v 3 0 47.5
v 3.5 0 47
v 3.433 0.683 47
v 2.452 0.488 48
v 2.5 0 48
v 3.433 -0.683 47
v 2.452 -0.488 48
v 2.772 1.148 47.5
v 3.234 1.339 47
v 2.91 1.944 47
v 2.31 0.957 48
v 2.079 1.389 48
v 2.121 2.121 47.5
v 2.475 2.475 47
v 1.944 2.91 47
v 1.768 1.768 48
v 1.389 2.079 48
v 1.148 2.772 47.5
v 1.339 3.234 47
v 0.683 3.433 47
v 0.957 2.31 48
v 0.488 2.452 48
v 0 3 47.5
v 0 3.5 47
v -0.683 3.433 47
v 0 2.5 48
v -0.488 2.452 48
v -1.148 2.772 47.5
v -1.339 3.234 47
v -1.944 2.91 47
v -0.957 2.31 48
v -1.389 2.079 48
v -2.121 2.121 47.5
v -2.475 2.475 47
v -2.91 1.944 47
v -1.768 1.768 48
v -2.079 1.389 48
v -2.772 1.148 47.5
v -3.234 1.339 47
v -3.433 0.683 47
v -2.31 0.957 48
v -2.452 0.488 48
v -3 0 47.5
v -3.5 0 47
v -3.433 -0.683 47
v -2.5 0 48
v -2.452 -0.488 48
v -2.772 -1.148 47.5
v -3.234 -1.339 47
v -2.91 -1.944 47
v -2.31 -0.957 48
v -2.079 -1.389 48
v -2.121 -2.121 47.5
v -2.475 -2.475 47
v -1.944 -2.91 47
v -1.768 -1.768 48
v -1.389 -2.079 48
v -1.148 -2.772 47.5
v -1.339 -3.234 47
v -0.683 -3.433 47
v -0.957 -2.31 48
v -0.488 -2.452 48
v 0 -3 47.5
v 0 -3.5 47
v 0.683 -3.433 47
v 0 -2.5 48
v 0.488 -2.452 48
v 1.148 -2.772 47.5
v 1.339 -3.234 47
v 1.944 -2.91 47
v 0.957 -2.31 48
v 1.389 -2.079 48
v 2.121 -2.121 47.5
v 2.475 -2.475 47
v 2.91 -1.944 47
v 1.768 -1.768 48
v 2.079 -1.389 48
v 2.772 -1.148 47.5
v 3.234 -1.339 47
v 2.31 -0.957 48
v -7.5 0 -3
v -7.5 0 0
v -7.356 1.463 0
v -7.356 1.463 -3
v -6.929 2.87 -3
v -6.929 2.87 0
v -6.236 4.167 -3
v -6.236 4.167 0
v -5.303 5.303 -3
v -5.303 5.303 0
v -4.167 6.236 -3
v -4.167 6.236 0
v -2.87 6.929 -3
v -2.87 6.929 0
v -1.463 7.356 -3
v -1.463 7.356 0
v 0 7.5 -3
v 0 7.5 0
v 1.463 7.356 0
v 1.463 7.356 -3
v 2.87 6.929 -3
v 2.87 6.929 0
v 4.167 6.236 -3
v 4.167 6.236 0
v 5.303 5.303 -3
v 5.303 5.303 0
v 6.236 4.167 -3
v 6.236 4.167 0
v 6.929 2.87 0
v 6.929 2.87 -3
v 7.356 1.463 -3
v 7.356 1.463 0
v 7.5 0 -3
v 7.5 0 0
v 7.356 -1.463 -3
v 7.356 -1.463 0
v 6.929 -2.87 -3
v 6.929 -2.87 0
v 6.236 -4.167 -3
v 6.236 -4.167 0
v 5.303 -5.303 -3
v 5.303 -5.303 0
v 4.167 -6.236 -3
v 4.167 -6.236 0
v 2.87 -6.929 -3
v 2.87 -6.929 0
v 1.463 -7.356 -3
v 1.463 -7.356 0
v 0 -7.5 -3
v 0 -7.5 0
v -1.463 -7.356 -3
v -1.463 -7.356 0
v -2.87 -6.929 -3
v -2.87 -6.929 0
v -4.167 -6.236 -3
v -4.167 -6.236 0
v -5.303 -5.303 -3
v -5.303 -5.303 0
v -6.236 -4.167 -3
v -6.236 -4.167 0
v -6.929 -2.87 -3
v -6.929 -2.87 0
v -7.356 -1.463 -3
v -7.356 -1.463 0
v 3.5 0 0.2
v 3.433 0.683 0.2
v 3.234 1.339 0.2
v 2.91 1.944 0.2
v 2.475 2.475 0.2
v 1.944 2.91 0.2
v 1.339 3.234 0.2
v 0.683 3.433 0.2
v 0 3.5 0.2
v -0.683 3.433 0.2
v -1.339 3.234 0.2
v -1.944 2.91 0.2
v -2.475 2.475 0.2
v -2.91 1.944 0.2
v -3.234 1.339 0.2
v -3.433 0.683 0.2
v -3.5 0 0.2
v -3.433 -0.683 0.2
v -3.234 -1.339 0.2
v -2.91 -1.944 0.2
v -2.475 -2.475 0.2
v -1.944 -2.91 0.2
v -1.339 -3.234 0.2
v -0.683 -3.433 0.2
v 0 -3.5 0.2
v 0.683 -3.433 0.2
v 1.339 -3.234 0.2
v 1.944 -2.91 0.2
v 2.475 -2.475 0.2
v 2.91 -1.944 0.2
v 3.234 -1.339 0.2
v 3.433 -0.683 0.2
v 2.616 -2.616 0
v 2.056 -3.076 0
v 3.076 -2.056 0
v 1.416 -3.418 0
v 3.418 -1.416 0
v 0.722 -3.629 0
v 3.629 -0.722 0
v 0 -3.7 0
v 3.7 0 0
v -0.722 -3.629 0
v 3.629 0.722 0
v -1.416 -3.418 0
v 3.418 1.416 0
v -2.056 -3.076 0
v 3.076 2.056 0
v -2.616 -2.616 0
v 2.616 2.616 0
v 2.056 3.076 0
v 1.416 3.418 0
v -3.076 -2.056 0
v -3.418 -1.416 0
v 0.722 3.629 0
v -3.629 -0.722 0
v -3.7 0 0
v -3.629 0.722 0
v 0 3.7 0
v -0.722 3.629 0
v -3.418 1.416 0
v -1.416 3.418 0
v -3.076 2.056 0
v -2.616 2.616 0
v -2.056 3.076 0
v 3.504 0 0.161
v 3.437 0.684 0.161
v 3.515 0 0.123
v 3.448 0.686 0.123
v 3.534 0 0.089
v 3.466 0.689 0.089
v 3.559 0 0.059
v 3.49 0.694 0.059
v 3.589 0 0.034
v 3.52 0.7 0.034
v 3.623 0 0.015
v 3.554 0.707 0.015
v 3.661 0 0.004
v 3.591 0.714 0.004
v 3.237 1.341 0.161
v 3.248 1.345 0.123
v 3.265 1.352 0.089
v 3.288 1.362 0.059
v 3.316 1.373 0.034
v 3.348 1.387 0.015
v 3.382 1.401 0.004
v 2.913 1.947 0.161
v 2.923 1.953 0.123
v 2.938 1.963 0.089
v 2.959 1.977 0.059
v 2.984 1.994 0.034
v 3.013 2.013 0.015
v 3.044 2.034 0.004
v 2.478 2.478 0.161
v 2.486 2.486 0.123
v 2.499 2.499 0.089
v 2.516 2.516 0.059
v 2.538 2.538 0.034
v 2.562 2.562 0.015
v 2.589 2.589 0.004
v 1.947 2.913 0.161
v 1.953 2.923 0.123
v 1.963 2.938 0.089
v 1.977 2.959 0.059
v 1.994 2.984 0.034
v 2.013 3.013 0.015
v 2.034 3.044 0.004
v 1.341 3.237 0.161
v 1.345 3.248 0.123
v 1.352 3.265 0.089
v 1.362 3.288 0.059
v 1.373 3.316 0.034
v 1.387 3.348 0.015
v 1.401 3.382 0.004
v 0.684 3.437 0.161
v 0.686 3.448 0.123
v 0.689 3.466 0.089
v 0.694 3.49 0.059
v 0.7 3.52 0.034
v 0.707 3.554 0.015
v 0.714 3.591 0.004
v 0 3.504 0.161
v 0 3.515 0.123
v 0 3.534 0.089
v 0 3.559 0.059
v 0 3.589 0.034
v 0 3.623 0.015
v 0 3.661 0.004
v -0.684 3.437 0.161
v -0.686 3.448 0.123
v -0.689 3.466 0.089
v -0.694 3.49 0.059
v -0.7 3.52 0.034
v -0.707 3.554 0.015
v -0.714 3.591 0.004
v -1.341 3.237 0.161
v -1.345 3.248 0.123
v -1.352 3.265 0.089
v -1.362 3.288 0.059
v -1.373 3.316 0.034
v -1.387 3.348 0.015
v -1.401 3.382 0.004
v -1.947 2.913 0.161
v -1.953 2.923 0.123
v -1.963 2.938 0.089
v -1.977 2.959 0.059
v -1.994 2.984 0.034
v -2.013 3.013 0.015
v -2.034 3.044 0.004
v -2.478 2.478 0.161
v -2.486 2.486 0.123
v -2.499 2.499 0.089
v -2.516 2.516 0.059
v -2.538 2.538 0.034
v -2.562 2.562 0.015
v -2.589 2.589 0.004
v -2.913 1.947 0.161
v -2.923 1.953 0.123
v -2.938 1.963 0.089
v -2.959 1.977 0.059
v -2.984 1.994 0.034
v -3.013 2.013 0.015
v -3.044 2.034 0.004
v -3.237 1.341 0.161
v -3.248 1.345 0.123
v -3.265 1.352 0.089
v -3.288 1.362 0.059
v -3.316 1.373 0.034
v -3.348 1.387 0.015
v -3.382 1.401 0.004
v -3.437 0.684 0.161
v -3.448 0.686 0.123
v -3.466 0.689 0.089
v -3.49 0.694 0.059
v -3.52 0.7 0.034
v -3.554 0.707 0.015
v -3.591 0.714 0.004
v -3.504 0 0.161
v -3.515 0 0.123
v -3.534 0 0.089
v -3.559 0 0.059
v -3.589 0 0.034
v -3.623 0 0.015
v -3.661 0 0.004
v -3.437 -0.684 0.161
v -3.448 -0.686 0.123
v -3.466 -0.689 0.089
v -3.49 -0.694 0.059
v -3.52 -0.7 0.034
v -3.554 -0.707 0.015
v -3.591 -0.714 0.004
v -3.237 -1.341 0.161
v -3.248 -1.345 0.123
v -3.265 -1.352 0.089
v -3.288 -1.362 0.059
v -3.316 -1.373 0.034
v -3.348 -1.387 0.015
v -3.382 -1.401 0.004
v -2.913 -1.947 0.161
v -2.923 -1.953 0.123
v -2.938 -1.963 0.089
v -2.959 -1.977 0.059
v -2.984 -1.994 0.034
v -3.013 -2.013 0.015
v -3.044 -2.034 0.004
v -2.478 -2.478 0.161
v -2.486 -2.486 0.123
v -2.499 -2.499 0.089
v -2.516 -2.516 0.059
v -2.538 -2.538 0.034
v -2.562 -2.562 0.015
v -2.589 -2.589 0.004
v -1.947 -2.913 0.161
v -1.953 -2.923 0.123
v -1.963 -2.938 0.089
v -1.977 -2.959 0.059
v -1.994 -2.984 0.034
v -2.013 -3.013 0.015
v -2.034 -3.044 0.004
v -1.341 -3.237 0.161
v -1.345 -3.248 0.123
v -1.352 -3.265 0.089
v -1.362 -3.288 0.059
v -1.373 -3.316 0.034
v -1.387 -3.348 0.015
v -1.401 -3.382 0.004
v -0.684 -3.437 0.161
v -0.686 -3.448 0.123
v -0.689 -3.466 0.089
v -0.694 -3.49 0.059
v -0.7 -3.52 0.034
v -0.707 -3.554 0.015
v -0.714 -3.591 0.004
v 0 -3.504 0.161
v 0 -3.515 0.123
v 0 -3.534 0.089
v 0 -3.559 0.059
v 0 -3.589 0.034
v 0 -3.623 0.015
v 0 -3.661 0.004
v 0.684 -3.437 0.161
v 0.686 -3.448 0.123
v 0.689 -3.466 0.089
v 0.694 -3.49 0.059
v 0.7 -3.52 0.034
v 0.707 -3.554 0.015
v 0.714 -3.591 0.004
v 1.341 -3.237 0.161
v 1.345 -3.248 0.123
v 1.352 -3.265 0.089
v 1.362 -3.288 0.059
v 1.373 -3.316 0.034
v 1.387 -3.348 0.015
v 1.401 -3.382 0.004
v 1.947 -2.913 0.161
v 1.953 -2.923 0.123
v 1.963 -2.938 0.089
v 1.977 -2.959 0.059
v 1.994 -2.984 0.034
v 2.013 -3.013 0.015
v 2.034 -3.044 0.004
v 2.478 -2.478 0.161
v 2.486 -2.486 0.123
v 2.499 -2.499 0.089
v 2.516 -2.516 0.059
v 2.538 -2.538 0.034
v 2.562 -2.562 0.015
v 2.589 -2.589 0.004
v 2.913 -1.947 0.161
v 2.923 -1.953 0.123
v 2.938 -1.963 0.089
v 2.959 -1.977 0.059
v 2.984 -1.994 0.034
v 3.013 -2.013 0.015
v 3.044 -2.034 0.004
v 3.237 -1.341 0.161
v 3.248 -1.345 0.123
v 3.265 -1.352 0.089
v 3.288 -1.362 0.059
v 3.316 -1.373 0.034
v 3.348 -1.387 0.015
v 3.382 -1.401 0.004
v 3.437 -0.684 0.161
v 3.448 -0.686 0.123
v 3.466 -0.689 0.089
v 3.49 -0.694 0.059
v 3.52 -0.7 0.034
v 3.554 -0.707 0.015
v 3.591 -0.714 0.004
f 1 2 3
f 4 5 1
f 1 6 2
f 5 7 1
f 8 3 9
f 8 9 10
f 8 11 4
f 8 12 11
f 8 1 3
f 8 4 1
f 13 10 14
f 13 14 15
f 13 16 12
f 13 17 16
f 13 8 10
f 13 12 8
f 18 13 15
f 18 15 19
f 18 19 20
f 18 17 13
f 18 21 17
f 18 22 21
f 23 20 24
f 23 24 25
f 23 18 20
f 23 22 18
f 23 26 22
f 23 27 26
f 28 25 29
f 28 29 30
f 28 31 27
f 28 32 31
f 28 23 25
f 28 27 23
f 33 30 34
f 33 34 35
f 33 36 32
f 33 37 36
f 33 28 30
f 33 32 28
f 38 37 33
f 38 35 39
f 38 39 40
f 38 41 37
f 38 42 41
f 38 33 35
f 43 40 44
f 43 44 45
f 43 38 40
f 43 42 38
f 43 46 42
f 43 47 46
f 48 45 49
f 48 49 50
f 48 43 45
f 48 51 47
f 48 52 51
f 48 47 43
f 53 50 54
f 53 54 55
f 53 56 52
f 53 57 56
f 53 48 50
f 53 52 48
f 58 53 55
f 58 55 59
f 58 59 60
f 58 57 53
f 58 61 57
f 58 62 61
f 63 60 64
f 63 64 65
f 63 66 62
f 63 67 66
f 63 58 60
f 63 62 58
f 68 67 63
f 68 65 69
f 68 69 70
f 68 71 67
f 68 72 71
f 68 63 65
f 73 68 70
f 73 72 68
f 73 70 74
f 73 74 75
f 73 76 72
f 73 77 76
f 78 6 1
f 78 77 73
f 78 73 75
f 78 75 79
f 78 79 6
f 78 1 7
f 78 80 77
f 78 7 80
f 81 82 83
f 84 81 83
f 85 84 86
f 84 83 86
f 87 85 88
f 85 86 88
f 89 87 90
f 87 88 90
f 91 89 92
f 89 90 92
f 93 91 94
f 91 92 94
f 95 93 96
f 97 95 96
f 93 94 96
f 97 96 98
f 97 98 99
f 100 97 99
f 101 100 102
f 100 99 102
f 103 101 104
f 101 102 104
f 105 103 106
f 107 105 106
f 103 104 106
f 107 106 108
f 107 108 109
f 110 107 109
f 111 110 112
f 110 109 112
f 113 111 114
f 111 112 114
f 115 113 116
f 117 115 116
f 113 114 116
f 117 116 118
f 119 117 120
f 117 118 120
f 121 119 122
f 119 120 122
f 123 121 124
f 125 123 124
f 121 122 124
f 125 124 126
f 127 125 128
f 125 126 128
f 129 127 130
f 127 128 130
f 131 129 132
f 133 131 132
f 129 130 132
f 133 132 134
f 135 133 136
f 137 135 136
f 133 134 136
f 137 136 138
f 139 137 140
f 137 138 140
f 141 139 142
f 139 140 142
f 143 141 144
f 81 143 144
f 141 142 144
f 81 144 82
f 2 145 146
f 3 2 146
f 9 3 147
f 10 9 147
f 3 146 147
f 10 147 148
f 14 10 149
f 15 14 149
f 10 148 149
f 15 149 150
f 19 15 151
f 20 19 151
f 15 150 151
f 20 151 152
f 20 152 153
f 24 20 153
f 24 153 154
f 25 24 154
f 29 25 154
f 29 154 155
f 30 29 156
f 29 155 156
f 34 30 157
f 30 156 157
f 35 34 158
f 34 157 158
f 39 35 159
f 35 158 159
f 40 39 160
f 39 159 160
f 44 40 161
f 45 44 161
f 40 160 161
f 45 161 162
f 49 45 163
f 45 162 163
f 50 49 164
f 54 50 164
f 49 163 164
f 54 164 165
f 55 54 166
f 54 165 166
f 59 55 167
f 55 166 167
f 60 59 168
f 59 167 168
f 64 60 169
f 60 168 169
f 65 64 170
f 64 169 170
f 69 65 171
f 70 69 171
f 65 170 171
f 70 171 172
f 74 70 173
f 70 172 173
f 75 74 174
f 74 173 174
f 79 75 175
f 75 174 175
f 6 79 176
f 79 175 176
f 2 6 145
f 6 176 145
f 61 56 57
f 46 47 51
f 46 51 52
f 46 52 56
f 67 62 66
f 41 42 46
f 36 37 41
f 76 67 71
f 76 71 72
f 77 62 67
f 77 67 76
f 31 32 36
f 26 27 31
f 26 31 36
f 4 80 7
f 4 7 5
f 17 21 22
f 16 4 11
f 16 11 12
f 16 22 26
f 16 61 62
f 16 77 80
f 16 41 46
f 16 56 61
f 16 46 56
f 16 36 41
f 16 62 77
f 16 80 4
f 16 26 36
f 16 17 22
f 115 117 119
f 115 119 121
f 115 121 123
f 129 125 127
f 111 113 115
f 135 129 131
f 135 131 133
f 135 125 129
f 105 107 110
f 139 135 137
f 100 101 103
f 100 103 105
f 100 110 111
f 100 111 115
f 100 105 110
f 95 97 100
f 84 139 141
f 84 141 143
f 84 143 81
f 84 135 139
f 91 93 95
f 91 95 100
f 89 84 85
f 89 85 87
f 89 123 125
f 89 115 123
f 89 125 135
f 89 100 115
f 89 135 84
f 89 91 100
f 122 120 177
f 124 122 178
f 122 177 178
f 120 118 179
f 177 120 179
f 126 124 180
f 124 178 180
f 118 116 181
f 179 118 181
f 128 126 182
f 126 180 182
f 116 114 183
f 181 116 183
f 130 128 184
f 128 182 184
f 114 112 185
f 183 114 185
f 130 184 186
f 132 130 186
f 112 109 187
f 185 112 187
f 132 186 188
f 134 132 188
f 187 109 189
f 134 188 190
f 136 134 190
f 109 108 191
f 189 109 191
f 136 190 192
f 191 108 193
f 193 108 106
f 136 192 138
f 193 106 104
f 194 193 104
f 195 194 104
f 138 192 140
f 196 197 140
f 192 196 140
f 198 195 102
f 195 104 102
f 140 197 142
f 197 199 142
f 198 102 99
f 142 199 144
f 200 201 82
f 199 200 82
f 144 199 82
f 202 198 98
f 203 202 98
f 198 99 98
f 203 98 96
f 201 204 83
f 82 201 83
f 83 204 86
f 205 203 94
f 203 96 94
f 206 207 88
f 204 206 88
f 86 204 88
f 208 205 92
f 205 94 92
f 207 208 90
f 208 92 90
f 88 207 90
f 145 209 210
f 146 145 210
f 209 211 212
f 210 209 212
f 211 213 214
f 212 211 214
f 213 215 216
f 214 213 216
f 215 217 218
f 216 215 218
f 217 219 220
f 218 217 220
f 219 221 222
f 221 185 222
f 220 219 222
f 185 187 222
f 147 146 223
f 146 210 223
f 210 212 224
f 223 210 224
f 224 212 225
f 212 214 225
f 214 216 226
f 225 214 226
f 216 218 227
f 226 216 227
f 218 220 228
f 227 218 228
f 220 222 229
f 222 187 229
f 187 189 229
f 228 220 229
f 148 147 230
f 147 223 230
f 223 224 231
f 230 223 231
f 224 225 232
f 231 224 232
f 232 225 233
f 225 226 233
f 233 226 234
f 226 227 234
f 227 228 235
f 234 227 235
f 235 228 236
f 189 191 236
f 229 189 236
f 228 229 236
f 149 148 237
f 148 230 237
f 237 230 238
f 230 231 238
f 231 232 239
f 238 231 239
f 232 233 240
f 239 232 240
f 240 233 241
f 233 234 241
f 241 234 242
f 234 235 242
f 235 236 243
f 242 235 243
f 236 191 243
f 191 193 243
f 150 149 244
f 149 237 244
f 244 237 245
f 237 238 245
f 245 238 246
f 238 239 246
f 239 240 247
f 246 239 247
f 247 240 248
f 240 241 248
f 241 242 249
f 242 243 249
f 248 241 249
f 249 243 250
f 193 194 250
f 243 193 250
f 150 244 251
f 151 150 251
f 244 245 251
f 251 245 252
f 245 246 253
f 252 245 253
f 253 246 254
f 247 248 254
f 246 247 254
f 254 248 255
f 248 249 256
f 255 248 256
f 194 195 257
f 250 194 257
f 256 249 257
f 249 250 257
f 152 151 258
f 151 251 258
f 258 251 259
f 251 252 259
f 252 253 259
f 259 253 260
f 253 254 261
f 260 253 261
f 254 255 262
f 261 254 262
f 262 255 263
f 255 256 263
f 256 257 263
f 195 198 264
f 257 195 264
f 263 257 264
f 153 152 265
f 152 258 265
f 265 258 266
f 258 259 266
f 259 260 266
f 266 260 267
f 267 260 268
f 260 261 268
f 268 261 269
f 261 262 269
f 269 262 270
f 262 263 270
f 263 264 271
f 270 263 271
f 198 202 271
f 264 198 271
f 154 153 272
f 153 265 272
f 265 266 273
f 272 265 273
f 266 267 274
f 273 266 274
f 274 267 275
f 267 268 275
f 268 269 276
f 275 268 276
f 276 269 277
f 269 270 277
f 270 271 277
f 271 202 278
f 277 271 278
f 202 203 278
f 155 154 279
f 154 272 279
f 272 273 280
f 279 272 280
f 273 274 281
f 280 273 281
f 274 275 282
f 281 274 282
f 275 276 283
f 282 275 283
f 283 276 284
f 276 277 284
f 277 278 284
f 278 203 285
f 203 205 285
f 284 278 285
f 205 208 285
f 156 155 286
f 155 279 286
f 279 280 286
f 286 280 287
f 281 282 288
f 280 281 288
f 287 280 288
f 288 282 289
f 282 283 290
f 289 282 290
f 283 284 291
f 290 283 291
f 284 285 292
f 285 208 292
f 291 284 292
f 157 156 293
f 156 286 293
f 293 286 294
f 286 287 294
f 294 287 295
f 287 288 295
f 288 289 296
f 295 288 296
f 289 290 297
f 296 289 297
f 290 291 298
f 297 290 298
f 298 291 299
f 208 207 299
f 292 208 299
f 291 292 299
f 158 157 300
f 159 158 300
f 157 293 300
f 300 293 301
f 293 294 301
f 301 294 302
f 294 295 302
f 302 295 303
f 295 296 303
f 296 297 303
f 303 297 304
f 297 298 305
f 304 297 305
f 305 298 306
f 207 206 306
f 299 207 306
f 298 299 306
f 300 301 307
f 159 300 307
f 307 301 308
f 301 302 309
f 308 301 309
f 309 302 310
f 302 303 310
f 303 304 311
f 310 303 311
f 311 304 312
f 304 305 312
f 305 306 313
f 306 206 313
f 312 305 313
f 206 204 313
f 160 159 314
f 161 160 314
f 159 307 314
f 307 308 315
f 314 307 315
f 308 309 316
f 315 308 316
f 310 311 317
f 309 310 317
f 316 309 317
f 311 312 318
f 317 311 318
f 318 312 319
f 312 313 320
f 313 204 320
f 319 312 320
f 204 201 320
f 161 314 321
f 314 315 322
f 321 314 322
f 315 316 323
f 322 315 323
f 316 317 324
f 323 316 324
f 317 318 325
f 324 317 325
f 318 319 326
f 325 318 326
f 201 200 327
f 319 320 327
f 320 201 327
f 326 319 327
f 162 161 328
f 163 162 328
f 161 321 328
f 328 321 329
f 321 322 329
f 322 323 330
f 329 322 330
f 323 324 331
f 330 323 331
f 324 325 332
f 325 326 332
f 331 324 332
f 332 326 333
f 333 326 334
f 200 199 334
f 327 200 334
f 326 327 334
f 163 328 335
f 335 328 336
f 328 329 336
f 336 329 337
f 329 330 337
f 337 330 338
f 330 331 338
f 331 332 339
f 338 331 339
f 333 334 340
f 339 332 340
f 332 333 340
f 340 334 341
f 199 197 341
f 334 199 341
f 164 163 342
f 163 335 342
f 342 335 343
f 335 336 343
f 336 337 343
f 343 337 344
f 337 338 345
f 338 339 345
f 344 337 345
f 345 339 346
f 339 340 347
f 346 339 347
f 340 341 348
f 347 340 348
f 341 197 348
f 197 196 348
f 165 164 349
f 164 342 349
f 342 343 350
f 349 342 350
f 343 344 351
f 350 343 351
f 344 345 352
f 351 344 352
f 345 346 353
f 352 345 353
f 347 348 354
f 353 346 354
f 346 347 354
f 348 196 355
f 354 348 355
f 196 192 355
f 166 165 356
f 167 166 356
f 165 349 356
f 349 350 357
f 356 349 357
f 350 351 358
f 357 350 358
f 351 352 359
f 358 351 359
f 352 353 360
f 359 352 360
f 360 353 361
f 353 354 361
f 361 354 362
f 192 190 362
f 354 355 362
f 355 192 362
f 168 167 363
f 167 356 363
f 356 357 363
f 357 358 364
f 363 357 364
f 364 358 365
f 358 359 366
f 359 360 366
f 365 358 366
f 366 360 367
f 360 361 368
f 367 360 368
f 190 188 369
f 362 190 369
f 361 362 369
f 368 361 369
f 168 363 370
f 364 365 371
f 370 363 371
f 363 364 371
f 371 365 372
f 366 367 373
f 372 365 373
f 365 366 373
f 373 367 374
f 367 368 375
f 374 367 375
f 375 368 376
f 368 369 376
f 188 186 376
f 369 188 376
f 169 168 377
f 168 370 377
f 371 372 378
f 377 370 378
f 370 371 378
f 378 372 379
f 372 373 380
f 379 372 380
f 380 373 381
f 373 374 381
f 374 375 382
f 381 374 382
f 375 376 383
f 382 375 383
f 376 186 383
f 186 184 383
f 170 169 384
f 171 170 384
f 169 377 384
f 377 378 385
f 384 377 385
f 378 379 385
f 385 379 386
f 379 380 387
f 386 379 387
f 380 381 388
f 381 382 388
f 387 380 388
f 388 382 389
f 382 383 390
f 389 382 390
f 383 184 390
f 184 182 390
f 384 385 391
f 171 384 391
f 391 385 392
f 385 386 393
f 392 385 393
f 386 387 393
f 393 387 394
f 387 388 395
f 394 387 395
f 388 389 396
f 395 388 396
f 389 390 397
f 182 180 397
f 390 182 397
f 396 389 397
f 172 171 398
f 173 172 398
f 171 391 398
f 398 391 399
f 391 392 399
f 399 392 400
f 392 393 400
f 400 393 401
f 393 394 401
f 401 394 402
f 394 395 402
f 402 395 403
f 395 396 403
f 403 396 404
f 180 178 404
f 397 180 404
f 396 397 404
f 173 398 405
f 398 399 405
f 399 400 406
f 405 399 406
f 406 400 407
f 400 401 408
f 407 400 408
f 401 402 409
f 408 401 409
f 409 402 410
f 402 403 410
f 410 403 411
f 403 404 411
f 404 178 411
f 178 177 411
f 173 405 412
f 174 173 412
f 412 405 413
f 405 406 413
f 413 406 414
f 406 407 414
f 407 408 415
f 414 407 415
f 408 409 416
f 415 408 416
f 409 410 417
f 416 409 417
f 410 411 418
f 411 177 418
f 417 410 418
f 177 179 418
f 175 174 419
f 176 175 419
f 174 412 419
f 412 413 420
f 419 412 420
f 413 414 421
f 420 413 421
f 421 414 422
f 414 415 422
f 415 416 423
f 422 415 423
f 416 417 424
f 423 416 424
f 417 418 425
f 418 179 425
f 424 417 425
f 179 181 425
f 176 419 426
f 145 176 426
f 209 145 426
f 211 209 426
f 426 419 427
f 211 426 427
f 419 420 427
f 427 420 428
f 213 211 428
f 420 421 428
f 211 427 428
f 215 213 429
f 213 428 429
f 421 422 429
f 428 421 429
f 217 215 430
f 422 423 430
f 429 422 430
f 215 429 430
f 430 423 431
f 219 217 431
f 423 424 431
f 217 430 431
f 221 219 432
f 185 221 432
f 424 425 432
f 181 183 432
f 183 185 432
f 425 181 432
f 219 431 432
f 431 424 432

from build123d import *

# Parameters (mm, degrees)
SKETCH1_R           = 3.5
BOSS_EXTRUDE1_DEPTH = 48
SKETCH2_R           = 7.5
BOSS_EXTRUDE2_DEPTH = 3
CHAMFER1_SIZE       = 1
FILLET1_R           = 0.2


with BuildPart() as part:
    # Sketch1 → Boss-Extrude1 (new body)
    with BuildSketch(Plane.XY):
        Circle(SKETCH1_R)
    extrude(amount=BOSS_EXTRUDE1_DEPTH)

    # Sketch2 → Boss-Extrude2 (add)
    with BuildSketch(Plane(origin=(0, 0, 0), x_dir=(-1, 0, 0), z_dir=(0, 0, -1))):
        Circle(SKETCH2_R)
    extrude(amount=BOSS_EXTRUDE2_DEPTH)

    # Chamfer1
    chamfer1_edges = [part.edges().sort_by_distance(p)[0] for p in [
        (-3.5, 0, 48),
    ]]
    chamfer(chamfer1_edges, length=CHAMFER1_SIZE)

    # Fillet1
    fillet1_edges = [part.edges().sort_by_distance(p)[0] for p in [
        (-3.5, 0, 0),
    ]]
    fillet(fillet1_edges, radius=FILLET1_R)


solid = part.part
